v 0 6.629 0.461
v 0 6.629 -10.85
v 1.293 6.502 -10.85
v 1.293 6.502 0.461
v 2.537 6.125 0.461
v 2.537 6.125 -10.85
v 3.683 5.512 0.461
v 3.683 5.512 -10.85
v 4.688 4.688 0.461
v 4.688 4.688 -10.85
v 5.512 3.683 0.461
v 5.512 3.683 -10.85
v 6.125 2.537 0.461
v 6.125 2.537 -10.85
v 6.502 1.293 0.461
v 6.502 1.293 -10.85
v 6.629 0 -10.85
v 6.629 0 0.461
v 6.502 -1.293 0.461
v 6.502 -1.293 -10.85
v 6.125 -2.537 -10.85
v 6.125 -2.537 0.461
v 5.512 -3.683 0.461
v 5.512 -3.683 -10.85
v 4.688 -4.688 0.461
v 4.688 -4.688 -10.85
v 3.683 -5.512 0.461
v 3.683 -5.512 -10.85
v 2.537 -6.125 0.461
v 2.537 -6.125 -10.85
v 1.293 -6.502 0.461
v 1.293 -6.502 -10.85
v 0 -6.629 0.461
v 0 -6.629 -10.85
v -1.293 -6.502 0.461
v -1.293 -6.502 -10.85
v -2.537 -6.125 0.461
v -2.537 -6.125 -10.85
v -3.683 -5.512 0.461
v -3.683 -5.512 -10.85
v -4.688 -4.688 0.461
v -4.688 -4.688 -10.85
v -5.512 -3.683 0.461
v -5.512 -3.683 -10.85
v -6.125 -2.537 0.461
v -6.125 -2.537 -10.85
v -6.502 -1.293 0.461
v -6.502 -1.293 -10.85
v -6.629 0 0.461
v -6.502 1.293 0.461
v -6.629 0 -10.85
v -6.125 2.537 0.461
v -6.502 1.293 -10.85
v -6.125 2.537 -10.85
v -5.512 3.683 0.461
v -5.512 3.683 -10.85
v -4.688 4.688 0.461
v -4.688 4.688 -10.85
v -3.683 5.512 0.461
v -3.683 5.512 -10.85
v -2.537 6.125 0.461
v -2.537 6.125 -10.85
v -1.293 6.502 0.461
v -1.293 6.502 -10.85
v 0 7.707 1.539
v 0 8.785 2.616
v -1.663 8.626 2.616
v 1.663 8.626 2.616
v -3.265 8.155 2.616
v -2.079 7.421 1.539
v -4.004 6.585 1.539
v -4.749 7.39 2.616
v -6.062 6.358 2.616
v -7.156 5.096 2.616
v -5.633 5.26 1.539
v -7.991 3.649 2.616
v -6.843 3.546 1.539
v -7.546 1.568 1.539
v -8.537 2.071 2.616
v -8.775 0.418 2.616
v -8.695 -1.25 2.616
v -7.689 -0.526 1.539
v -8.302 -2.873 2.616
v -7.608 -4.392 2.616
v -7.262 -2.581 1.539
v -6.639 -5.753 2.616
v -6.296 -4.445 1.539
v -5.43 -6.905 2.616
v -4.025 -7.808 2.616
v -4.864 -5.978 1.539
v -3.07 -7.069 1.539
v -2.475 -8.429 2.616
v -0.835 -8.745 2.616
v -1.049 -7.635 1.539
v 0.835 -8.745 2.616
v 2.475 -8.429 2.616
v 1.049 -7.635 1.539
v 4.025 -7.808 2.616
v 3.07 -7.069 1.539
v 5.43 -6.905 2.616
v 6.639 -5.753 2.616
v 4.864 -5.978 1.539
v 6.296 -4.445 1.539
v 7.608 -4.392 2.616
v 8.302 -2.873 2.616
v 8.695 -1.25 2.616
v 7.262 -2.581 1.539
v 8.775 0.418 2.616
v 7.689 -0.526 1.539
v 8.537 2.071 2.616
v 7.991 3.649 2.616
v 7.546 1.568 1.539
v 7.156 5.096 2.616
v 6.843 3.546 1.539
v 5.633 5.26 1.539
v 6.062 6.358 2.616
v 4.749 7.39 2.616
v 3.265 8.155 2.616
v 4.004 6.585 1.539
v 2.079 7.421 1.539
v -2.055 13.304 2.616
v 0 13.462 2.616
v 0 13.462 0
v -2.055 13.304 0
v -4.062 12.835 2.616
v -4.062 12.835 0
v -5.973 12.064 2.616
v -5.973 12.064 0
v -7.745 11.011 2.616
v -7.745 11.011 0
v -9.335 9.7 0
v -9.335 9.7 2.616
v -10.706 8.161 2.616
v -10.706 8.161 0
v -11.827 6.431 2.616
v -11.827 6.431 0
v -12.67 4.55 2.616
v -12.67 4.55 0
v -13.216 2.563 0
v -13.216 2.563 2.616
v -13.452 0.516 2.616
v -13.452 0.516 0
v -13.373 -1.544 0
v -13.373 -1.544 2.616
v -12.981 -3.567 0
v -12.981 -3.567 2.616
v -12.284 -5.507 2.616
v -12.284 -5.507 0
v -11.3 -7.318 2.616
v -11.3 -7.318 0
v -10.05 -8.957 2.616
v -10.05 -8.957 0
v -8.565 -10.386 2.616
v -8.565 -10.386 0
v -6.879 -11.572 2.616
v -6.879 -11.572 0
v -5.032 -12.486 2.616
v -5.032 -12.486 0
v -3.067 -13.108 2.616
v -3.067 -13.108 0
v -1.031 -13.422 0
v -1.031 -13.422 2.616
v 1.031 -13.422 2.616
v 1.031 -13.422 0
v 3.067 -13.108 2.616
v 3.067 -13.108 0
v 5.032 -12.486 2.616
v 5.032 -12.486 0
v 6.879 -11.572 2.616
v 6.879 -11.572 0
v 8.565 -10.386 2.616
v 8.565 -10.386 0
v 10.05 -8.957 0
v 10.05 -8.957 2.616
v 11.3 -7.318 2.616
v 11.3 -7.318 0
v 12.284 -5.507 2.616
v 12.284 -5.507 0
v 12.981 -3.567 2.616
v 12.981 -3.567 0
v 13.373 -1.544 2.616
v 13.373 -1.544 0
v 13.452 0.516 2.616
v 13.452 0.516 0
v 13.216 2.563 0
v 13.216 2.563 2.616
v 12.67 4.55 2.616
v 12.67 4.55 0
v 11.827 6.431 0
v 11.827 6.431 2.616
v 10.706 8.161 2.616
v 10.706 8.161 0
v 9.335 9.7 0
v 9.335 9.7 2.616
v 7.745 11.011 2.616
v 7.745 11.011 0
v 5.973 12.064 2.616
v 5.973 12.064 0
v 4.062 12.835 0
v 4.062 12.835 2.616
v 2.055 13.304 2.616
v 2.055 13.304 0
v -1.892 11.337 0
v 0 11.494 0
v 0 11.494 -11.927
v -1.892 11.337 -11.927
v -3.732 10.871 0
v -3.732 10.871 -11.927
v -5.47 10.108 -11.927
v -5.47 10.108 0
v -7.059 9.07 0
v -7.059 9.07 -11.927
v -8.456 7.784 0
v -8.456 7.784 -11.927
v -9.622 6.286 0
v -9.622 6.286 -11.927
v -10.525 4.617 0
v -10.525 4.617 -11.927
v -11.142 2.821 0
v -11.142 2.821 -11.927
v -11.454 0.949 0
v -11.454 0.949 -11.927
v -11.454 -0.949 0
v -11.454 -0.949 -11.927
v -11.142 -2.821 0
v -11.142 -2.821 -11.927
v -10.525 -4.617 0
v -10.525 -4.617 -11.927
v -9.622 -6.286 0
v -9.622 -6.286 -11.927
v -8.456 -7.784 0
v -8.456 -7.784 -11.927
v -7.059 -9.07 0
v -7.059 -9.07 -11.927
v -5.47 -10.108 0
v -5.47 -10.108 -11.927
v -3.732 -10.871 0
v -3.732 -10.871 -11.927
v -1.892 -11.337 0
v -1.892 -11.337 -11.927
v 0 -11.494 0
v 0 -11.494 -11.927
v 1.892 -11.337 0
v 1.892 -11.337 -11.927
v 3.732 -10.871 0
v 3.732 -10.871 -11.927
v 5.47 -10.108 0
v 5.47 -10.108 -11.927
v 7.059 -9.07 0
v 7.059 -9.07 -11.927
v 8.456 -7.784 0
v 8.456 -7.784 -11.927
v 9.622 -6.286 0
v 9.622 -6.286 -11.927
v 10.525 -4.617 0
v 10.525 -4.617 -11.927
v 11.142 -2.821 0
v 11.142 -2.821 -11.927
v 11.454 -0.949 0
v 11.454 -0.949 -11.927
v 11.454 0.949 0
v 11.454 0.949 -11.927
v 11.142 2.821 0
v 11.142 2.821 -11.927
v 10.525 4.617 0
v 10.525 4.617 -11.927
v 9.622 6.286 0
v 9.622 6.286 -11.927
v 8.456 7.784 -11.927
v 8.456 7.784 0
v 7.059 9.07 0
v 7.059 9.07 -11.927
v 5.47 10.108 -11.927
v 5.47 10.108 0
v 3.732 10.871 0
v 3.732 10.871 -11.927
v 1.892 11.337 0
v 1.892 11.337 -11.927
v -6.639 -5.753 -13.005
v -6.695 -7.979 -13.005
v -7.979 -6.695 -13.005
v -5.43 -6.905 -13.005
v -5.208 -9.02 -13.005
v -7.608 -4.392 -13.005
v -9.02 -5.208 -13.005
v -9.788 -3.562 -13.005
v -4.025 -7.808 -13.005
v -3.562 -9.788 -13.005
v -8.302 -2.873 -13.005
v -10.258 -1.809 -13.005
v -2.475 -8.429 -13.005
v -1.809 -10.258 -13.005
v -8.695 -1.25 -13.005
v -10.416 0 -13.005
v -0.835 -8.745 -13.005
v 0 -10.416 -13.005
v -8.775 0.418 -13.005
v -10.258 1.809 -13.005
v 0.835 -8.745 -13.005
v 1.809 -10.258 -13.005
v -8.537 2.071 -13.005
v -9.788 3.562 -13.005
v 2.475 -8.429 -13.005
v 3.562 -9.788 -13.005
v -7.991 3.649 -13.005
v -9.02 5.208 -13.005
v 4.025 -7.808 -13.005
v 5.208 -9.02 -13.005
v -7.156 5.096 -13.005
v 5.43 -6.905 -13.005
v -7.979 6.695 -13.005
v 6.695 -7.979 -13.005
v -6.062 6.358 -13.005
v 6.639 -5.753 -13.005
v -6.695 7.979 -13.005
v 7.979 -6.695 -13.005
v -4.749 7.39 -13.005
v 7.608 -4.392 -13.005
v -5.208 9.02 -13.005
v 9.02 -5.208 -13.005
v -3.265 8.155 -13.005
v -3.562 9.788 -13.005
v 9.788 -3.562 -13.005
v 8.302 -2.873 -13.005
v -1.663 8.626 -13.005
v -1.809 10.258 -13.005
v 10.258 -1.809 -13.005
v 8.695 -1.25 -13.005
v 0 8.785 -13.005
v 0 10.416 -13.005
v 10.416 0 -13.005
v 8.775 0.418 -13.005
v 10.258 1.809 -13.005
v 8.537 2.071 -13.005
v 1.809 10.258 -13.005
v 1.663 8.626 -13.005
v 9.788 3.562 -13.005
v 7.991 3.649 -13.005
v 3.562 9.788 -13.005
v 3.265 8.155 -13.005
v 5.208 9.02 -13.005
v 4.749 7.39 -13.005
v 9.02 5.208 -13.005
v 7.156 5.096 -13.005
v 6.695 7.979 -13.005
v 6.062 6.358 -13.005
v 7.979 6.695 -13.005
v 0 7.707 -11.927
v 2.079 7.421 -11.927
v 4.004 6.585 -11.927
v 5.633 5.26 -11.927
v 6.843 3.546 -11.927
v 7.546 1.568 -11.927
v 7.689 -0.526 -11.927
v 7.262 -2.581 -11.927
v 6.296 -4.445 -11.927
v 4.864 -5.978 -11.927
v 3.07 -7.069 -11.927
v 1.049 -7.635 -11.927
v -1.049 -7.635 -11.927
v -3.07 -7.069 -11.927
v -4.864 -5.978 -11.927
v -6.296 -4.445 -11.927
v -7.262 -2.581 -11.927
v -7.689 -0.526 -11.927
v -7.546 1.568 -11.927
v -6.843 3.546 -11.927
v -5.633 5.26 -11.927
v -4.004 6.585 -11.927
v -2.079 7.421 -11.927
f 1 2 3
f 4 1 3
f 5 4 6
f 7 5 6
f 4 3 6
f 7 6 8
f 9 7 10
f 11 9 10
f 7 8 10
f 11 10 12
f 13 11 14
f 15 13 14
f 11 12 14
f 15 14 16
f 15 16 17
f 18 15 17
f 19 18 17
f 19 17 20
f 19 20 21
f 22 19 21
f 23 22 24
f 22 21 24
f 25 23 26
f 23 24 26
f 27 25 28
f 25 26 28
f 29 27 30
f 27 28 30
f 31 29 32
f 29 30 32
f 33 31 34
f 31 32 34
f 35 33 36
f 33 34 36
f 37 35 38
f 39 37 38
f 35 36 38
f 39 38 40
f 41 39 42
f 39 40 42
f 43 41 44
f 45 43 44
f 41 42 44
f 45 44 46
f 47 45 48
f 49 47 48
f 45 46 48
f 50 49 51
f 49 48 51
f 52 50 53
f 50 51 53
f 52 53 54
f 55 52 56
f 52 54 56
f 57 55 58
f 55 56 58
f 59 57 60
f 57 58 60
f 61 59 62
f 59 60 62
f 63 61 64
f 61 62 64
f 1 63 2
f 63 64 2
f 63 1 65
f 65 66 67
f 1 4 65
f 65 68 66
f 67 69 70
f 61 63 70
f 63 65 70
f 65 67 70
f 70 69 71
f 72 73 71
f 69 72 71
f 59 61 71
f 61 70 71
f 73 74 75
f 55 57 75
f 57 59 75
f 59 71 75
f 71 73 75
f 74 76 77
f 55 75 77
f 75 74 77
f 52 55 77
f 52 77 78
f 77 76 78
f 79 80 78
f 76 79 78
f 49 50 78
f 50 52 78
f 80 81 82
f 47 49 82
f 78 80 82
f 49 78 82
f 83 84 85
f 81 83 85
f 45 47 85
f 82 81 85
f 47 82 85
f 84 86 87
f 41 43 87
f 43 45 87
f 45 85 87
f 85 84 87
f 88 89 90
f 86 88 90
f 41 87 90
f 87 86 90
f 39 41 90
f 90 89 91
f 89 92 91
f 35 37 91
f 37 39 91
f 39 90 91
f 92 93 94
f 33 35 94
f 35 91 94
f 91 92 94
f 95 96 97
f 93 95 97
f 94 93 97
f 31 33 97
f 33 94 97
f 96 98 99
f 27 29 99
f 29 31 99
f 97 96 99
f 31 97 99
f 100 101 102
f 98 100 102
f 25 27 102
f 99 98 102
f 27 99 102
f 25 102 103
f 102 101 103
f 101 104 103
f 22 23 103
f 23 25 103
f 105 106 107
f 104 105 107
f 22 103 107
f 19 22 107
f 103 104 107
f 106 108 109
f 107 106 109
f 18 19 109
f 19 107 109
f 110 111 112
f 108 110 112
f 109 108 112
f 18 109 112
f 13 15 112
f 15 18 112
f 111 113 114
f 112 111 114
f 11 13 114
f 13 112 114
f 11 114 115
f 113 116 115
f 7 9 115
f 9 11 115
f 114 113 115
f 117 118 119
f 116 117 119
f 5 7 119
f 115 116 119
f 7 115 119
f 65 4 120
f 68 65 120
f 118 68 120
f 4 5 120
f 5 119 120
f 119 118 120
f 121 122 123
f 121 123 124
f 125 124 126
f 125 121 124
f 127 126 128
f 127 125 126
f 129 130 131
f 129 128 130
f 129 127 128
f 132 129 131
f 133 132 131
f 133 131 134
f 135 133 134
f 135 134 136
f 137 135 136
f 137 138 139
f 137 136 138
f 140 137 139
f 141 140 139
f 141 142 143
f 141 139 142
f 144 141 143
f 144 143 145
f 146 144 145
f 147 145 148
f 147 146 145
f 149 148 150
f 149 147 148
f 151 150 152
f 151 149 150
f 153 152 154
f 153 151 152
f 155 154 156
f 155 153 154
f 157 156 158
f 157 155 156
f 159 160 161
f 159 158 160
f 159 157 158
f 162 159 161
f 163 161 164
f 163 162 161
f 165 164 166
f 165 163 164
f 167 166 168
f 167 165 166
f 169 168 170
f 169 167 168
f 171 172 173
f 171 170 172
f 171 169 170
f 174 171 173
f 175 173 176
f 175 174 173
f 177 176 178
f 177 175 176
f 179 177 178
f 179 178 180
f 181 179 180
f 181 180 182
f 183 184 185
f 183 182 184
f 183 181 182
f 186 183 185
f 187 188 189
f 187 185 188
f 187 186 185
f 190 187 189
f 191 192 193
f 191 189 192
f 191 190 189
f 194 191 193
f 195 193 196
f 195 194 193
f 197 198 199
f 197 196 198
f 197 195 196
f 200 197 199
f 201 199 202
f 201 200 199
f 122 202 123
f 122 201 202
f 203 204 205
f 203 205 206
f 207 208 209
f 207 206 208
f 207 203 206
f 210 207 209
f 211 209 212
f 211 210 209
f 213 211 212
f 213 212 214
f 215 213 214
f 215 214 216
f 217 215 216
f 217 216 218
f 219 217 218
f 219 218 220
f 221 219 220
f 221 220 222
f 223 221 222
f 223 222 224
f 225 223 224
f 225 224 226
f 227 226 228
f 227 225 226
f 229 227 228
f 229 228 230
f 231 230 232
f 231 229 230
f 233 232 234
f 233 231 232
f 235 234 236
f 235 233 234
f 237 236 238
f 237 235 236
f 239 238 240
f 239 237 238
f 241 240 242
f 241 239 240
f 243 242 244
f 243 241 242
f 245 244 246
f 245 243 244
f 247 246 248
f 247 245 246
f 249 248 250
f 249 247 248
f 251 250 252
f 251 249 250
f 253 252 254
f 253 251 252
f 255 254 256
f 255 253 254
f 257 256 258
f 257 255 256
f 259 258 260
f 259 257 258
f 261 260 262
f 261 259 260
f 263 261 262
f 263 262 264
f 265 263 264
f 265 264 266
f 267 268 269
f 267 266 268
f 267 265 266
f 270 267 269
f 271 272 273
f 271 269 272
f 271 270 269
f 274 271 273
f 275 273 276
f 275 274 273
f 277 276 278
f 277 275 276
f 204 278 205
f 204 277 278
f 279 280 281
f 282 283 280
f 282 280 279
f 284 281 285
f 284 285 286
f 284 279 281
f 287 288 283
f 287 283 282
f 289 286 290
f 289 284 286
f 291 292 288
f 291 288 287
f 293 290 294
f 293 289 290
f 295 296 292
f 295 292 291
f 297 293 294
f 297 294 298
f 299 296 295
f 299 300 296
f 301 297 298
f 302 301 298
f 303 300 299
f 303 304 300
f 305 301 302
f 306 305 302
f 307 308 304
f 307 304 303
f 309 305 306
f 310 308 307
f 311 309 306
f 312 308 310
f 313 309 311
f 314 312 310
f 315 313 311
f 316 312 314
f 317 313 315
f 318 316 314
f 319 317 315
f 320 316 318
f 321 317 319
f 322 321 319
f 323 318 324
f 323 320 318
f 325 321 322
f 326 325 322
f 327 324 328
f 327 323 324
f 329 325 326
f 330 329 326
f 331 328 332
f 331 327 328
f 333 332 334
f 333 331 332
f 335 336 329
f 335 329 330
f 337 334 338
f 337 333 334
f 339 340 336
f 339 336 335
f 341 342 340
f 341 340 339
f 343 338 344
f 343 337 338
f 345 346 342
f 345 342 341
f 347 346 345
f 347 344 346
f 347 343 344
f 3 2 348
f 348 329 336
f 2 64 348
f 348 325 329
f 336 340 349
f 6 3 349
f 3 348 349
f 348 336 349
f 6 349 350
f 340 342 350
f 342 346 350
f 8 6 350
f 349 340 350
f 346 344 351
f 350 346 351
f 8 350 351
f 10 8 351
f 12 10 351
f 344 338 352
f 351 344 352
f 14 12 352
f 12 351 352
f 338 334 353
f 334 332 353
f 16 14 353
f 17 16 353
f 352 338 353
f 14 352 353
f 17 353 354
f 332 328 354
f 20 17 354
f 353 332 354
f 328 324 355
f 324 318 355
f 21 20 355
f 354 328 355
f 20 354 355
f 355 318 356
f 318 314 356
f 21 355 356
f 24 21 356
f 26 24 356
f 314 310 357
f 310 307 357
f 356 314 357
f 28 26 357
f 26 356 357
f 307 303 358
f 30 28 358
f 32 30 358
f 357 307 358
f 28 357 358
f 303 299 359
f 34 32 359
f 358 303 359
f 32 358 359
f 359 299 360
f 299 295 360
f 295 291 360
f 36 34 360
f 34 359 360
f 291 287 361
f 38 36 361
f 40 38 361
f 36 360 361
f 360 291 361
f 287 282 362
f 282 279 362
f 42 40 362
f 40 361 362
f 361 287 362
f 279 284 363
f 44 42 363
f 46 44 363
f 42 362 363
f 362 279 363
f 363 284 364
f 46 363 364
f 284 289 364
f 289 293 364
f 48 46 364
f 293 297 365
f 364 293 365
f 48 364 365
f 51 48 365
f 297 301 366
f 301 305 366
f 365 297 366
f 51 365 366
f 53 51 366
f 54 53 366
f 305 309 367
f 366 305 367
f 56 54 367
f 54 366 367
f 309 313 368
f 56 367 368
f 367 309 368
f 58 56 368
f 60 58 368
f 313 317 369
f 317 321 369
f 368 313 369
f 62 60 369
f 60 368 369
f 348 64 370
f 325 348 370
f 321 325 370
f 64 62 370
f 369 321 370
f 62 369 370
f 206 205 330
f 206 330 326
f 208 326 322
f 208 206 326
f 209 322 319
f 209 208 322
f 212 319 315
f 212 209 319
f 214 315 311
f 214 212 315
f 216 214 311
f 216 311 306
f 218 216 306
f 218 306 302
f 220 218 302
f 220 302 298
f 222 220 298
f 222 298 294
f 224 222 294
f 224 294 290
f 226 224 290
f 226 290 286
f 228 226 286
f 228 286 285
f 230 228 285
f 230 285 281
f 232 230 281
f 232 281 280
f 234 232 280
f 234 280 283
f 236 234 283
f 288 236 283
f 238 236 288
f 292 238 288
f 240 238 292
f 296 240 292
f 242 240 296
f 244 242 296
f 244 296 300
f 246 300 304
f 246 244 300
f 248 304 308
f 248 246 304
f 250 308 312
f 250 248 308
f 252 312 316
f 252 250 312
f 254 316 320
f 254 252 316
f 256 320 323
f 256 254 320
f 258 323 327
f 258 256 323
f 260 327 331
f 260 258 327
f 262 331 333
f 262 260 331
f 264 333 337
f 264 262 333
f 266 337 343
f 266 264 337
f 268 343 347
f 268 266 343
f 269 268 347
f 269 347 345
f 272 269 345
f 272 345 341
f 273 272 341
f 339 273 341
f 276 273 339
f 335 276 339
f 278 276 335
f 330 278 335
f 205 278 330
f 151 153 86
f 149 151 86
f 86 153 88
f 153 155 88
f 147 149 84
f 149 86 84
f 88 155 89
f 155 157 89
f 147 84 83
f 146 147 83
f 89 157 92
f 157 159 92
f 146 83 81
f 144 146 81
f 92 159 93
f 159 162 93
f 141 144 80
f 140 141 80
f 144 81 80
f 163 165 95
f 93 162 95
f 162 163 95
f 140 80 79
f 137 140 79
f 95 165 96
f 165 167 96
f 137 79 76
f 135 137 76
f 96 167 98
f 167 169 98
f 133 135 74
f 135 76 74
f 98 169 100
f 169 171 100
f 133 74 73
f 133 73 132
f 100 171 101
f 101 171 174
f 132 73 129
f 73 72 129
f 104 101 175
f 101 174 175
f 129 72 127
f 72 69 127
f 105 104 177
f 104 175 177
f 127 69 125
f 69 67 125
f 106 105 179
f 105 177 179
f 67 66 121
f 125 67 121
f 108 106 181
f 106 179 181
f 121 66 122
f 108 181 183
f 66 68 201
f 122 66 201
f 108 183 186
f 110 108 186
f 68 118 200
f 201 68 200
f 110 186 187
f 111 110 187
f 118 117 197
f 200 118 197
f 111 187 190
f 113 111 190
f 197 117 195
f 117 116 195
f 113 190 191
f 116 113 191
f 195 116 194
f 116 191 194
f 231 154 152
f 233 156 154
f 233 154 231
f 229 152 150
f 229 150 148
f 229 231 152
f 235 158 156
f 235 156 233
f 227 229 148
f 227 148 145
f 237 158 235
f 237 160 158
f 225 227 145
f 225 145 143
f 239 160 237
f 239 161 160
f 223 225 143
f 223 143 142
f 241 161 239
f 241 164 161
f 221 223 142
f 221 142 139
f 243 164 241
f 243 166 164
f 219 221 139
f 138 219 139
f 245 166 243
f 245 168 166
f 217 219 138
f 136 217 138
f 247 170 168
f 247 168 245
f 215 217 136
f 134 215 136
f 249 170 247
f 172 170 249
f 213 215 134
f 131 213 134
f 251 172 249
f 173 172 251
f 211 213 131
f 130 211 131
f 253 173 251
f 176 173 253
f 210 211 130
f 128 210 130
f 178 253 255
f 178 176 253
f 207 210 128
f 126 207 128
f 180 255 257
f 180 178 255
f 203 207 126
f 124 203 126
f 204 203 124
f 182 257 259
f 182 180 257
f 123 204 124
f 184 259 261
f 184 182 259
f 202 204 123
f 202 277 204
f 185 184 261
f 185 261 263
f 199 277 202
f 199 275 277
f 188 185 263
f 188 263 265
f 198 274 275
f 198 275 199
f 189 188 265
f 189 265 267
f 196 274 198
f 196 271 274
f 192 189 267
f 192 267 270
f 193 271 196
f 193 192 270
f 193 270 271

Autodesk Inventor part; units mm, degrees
sketch "Sketch_2" plane through (0, 0, 0) normal (1, 0, 0) x (0, 1, 0)
  line L0 (0, -13.0048) -> (0, 2.6162)
  line L1 (8.7847, 2.6162) -> (6.6294, 0.4609)
  line L2 (6.6294, 0.4609) -> (6.6294, -10.8495)
  line L3 (6.6294, -10.8495) -> (8.7847, -13.0048)
  line L4 (8.7847, -13.0048) -> (10.4159, -13.0048)
  line L5 (10.4159, -13.0048) -> (11.4935, -11.9272)
  line L6 (11.4935, -11.9272) -> (11.4935, 0)
  line L7 (11.4935, 0) -> (13.462, 0)
  line L8 (13.462, 0) -> (13.462, 2.6162)
  line L9 (13.462, 2.6162) -> (8.7847, 2.6162)
revolve "Revolution1" add sketch "Sketch_2" angle 360 about axis through (0, 0, -13.0048) along (0, 0, -1)
ref_plane "bearings_XY" through (0, 0, 0) normal (0, 0, 1) x (1, 0, 0)
ref_plane "bearings_YZ" through (0, 0, 0) normal (1, 0, 0) x (0, 1, 0)
ref_plane "bearings_ZX" through (0, 0, 0) normal (0, 1, 0) x (0, 0, 1)
ref_plane "to_washer1_XY" through (0, 0, 0) normal (0, 0, 1) x (1, 0, 0)
ref_plane "to_washer1_YZ" through (0, 0, 0) normal (1, 0, 0) x (0, 1, 0)
ref_plane "to_washer1_ZX" through (0, 0, 0) normal (0, 1, 0) x (0, 0, 1)
ref_plane "to_washer2_XY" through (0, 0, 0) normal (0, 0, 1) x (1, 0, 0)
ref_plane "to_washer2_YZ" through (0, 0, 0) normal (1, 0, 0) x (0, 1, 0)
ref_plane "to_washer2_ZX" through (0, 0, 0) normal (0, 1, 0) x (0, 0, 1)
properties part number "52008.48"
